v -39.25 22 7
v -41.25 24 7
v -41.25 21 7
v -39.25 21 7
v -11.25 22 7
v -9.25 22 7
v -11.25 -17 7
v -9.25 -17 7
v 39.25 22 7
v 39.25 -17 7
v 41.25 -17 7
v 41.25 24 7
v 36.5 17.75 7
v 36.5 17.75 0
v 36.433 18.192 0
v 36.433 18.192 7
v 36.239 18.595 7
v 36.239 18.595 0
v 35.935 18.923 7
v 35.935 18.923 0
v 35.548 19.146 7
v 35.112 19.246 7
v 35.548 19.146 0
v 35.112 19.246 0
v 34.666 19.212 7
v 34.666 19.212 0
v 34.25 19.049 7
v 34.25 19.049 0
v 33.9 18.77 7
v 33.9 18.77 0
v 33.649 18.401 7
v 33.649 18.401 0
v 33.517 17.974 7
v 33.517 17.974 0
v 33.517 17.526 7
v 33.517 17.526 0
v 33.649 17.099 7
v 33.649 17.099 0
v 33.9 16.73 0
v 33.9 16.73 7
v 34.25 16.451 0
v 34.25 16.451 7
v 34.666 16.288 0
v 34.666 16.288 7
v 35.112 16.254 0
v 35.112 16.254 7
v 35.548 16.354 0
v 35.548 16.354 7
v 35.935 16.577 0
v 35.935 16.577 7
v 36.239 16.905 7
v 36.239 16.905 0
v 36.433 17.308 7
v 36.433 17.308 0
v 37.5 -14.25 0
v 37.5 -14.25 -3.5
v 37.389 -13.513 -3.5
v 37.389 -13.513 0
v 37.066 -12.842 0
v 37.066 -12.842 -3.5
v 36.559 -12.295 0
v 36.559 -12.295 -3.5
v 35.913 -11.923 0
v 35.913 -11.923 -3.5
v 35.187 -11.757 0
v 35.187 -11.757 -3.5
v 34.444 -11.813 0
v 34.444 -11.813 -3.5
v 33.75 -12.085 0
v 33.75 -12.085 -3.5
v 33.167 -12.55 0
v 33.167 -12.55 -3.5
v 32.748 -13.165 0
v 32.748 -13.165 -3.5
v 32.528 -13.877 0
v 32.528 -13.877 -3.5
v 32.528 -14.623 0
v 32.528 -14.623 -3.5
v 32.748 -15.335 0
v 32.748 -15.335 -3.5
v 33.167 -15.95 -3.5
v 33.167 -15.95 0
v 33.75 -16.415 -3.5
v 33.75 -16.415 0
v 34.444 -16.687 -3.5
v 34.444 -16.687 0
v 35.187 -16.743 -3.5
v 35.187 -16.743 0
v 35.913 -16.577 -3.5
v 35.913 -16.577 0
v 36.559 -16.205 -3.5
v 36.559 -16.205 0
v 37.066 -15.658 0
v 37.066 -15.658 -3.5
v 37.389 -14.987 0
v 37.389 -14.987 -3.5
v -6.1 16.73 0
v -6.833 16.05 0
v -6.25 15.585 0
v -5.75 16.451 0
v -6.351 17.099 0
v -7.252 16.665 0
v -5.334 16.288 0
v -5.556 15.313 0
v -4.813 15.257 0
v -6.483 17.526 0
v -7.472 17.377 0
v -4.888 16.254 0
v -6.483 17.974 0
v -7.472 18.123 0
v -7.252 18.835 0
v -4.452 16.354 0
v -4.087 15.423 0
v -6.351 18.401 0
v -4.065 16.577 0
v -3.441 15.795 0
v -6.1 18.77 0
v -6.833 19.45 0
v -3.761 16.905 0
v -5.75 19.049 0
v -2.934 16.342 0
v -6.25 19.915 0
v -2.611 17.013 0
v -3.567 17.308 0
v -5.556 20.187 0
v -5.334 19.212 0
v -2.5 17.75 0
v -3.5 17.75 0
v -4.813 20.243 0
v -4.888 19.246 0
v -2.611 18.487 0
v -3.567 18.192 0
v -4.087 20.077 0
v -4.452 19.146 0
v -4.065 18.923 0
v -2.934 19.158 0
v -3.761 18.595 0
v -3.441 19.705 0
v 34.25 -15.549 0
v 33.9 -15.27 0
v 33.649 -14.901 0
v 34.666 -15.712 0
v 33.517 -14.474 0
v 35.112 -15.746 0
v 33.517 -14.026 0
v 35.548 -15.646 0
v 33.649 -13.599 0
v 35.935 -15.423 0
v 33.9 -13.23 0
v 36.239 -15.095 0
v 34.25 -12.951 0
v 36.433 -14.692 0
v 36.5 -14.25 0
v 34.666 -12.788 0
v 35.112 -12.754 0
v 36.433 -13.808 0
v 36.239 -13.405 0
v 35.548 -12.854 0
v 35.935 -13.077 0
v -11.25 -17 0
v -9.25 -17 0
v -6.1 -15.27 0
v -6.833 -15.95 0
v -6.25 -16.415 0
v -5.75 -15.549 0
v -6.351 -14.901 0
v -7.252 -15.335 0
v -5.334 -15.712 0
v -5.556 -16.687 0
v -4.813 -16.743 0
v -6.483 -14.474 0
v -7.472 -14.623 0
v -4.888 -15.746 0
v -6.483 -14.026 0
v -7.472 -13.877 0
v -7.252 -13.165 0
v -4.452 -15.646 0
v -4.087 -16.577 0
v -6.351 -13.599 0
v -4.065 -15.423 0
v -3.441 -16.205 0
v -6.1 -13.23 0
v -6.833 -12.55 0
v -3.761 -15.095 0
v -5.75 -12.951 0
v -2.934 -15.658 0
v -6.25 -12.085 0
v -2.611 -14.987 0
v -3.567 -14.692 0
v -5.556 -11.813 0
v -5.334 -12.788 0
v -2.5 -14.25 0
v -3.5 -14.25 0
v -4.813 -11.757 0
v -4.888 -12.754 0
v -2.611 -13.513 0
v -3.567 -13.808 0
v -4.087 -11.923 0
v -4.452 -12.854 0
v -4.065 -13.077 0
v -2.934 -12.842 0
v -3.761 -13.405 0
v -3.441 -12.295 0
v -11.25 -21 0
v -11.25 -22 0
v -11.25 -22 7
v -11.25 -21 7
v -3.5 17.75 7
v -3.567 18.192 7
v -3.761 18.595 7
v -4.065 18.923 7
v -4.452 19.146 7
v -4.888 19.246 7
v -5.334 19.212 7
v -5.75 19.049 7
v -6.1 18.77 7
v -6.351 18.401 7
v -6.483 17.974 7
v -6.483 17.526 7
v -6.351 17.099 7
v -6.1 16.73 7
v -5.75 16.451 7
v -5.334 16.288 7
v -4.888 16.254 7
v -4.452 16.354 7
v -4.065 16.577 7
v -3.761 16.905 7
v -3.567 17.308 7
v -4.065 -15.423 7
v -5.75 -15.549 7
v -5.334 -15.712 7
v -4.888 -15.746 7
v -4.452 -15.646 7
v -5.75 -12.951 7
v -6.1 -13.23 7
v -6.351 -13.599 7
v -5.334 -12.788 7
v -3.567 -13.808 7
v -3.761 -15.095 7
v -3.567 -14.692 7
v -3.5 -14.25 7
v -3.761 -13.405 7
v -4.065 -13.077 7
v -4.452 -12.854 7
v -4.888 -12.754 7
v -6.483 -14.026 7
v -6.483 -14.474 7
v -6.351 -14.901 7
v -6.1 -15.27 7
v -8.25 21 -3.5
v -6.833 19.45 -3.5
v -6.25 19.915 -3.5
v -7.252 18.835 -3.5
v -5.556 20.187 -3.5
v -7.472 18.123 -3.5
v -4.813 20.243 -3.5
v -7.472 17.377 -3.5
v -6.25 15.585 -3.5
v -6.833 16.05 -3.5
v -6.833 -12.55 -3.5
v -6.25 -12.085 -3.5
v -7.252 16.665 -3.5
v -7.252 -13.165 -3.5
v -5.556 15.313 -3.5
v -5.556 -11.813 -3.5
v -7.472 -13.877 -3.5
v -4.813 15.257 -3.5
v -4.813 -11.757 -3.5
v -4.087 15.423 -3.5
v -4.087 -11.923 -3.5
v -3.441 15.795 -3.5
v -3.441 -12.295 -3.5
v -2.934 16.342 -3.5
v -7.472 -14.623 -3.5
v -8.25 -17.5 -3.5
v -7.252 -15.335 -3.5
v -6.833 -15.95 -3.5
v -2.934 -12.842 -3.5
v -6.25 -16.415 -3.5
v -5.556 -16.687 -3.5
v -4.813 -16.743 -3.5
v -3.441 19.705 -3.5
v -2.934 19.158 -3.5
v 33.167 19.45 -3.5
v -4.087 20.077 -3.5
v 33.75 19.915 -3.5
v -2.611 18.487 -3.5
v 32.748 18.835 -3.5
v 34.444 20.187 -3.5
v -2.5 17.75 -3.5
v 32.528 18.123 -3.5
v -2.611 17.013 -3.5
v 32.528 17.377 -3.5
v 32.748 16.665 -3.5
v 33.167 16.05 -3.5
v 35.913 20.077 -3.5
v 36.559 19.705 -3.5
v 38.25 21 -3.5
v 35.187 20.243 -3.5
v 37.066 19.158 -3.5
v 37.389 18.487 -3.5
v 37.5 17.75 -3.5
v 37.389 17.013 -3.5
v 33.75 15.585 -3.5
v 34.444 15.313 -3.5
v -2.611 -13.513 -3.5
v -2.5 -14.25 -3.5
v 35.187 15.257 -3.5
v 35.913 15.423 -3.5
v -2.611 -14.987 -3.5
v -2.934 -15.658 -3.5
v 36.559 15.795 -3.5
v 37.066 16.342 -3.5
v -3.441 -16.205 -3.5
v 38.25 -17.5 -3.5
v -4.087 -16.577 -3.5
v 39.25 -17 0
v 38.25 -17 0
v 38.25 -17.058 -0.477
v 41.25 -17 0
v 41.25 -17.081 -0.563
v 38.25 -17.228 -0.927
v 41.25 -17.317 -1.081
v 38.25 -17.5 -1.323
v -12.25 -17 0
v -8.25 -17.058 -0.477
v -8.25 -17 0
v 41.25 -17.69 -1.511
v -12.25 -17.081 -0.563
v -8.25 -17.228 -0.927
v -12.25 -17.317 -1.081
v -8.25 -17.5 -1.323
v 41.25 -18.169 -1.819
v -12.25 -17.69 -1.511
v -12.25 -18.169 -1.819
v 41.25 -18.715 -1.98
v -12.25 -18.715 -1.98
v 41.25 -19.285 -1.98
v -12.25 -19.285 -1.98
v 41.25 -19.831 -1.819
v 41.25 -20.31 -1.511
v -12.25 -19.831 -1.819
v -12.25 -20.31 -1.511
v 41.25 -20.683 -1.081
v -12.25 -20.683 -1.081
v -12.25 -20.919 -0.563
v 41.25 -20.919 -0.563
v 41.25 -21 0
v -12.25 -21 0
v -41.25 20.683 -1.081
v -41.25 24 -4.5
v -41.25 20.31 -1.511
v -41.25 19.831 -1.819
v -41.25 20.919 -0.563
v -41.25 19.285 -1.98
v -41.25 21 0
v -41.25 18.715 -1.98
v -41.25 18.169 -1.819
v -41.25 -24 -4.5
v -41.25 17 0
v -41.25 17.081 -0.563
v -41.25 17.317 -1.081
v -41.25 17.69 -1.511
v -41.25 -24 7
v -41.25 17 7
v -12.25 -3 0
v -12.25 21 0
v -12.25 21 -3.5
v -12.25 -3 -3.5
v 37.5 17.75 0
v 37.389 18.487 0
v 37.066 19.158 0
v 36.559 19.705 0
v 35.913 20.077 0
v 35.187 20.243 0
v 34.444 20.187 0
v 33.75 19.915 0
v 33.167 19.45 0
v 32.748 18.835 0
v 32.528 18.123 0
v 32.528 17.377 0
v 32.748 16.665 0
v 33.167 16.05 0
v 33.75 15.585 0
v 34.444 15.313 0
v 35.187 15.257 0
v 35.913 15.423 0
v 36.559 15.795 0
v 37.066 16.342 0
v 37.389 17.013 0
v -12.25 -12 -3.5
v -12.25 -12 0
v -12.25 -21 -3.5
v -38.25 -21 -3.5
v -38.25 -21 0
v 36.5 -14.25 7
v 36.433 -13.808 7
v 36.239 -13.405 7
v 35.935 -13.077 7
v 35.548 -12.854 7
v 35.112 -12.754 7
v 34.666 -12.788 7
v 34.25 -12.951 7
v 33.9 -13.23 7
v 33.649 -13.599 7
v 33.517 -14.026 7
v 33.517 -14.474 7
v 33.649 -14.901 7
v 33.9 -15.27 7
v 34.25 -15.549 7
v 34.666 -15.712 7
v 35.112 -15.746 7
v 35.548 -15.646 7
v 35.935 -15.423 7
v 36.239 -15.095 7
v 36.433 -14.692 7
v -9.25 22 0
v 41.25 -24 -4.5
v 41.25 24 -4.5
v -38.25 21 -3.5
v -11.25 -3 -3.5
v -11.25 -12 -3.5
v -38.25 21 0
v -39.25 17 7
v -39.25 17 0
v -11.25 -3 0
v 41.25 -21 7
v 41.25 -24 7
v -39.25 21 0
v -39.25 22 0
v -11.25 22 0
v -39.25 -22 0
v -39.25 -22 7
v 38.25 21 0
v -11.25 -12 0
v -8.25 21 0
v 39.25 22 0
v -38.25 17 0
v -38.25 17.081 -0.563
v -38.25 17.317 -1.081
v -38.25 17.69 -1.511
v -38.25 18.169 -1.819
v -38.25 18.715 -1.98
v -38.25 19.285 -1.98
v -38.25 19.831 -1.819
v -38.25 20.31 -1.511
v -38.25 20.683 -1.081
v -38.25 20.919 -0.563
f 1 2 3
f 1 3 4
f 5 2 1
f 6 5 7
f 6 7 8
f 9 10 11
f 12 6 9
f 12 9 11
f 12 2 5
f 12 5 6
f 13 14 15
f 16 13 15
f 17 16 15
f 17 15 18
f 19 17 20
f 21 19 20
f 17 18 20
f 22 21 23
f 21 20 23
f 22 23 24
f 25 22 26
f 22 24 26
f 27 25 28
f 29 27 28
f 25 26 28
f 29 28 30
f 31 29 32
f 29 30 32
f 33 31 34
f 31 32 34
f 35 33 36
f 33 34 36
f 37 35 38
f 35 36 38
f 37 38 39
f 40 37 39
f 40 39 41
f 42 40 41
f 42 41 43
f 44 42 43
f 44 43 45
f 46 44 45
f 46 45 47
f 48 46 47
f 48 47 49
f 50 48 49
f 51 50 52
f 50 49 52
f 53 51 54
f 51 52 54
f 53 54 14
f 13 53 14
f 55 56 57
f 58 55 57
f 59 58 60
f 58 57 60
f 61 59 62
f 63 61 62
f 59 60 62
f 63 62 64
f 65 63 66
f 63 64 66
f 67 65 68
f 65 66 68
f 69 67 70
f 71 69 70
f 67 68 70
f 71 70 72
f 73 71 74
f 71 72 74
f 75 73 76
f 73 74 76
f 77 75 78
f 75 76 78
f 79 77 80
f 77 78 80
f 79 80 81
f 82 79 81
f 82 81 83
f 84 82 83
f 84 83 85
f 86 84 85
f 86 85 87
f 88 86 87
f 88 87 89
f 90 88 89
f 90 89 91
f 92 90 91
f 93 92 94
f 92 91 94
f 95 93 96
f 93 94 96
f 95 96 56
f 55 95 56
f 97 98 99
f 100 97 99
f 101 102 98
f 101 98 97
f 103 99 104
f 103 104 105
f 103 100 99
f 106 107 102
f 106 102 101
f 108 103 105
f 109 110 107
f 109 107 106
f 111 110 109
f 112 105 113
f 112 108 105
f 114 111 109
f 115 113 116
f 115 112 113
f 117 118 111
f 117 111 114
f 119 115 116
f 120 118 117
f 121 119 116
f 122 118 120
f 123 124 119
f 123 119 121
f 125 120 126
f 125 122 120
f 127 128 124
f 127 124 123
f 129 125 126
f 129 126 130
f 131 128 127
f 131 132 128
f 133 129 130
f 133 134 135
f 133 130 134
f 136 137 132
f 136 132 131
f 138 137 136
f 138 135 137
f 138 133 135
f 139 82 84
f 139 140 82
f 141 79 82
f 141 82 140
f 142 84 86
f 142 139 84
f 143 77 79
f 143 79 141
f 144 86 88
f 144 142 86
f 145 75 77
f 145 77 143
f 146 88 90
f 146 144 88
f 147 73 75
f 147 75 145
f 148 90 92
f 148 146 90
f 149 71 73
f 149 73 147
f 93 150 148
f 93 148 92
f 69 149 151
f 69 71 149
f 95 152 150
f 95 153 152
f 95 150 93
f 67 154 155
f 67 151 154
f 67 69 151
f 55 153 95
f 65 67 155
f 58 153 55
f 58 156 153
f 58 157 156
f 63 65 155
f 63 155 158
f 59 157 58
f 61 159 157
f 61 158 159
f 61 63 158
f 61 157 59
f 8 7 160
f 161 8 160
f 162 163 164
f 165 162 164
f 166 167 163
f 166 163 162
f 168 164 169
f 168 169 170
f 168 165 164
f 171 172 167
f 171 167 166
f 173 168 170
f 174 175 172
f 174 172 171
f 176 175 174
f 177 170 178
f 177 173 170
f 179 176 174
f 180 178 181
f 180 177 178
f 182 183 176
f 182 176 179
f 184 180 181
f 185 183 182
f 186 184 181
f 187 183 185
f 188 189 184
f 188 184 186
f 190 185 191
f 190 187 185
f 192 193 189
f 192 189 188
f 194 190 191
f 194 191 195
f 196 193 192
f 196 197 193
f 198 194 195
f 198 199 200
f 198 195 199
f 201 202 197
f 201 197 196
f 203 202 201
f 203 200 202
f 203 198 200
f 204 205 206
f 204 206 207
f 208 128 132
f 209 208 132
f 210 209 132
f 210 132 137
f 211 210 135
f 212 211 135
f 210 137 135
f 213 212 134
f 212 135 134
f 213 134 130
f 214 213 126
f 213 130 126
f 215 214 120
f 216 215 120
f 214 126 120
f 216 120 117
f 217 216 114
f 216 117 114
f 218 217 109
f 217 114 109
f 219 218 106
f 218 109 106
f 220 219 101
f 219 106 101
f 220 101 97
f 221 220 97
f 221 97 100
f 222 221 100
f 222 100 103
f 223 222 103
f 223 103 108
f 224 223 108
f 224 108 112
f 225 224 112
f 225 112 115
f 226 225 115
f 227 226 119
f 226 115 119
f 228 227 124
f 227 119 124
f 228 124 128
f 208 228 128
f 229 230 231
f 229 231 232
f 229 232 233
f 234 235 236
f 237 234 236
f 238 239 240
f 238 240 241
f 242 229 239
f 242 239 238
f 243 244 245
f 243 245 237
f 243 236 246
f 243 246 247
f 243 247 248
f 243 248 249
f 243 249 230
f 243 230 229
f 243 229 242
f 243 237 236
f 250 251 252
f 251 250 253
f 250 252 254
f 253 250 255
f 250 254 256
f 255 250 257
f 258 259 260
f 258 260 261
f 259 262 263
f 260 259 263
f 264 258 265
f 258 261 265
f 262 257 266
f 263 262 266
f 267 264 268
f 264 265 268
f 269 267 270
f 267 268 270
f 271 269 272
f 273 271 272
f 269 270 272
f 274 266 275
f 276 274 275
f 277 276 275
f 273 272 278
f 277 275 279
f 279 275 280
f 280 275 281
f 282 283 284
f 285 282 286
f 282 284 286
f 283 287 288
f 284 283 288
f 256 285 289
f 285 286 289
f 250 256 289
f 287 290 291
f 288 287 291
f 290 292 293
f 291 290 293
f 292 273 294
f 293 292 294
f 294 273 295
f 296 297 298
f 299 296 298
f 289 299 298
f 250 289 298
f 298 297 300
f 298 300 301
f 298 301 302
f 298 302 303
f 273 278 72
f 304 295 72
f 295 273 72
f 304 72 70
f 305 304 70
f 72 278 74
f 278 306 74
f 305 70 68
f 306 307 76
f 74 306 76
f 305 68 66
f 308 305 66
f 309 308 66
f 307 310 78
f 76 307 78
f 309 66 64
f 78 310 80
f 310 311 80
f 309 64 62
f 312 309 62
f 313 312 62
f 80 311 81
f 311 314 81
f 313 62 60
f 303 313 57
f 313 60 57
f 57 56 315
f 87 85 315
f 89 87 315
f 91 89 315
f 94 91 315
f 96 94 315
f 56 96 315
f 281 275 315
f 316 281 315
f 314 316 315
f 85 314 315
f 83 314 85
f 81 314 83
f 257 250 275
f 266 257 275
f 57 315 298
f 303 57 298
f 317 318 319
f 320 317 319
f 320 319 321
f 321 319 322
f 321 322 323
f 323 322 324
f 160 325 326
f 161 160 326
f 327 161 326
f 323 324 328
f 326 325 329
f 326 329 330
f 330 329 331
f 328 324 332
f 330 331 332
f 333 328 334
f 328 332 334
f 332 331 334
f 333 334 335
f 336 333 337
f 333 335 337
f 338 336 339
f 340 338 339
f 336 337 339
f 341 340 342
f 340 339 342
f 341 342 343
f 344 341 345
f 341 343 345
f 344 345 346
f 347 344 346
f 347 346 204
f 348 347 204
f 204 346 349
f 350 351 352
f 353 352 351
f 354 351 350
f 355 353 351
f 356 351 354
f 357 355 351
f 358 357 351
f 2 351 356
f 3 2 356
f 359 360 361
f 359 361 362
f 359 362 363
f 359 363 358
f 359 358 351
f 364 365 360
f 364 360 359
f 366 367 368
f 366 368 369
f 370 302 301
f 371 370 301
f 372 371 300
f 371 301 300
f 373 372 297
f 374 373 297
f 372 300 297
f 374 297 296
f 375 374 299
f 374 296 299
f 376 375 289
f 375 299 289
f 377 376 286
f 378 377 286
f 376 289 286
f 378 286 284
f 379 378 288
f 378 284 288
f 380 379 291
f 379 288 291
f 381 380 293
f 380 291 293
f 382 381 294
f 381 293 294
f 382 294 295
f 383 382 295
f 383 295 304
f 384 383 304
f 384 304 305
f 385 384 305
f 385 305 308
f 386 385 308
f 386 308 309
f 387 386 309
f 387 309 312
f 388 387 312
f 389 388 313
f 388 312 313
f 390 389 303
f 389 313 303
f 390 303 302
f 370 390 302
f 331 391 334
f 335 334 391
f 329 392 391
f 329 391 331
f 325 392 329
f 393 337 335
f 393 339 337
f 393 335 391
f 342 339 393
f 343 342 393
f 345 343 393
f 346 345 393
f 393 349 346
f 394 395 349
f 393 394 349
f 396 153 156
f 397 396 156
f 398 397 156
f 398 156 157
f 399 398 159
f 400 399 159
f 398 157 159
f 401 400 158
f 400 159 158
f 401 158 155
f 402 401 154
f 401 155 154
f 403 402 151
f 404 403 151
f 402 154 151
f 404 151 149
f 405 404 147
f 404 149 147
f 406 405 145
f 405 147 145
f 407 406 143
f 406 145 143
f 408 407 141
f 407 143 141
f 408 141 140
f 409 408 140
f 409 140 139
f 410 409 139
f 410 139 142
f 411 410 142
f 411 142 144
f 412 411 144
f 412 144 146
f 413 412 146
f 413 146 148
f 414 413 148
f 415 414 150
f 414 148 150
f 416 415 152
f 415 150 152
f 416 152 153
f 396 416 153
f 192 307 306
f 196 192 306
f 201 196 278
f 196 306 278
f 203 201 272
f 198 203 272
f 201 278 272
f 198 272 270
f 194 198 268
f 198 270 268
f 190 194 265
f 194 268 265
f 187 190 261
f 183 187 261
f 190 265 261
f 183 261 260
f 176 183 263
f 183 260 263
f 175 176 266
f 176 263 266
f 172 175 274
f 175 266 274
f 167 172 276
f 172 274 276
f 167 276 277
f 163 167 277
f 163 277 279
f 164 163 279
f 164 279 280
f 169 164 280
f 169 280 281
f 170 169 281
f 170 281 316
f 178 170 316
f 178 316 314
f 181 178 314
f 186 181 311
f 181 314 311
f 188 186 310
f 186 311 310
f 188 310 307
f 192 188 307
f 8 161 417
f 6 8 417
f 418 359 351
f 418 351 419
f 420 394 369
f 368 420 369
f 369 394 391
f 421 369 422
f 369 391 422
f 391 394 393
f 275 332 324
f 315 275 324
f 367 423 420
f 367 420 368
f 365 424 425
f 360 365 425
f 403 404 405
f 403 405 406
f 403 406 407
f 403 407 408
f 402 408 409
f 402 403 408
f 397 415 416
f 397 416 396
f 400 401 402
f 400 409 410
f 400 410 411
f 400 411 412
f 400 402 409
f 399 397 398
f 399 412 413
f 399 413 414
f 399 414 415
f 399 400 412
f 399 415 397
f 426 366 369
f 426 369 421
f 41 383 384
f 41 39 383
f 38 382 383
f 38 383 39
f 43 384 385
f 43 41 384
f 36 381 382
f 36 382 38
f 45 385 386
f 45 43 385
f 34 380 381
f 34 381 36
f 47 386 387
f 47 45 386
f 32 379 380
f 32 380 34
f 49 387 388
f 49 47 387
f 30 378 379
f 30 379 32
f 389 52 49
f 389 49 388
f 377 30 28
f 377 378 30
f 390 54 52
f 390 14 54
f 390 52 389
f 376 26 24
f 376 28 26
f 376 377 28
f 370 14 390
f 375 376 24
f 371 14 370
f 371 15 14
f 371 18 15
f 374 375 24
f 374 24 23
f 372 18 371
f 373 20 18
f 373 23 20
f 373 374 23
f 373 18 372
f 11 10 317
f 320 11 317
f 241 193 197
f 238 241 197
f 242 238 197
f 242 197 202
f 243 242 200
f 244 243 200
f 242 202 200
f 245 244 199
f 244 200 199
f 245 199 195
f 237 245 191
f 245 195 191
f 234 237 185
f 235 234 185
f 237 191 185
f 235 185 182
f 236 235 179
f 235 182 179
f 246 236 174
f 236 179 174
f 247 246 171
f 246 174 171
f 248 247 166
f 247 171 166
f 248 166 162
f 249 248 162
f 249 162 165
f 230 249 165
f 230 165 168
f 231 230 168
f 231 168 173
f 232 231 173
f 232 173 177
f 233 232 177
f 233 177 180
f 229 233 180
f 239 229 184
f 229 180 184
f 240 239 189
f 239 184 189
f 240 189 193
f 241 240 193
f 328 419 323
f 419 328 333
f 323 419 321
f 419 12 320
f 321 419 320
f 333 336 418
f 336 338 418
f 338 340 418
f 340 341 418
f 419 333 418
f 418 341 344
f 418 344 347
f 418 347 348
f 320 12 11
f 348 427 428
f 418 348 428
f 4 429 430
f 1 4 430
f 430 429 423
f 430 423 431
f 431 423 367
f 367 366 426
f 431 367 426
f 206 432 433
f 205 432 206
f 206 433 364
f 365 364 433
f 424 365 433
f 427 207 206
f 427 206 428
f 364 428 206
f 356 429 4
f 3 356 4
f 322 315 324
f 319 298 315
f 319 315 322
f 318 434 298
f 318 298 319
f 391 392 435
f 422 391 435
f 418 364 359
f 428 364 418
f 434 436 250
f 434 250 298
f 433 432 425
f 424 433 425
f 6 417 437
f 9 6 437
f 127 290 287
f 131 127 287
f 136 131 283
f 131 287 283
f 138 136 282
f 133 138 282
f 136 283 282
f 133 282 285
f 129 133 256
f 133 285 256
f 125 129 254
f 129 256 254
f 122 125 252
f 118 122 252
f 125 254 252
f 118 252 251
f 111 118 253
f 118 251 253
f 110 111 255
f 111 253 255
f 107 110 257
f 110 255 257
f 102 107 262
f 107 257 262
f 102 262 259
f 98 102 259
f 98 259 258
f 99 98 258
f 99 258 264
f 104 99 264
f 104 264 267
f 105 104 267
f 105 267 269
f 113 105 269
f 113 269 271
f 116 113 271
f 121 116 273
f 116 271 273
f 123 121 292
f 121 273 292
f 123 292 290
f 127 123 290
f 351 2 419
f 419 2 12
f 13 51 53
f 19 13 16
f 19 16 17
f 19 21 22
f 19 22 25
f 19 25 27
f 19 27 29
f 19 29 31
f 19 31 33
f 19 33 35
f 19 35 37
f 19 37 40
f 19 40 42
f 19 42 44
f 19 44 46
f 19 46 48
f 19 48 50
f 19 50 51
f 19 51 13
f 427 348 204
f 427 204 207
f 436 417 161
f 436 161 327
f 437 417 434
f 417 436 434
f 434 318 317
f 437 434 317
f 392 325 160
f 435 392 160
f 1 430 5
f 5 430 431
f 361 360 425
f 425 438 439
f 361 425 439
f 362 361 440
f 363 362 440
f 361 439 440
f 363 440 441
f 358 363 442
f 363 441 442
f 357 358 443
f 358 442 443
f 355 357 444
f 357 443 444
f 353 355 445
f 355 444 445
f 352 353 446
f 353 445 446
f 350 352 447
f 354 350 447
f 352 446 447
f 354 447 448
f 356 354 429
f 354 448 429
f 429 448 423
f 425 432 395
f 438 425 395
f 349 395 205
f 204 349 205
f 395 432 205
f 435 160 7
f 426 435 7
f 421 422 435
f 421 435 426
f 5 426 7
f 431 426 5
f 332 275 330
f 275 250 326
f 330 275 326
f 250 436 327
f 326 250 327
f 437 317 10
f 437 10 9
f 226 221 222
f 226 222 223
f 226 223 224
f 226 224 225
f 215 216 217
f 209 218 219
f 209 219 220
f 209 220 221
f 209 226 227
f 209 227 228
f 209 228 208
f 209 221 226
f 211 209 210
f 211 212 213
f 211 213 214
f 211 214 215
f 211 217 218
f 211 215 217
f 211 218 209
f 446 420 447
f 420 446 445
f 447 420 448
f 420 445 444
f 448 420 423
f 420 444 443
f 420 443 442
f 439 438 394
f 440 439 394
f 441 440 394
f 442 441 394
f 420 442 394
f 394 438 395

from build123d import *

# Parameters (mm, degrees)
SKETCH005_W     = 82.5
SKETCH005_H     = 48
SKETCH005_W_2   = 28
SKETCH005_H_2   = 44
SKETCH005_W_3   = 48.5
SKETCH005_H_3   = 40.5
PAD003_DEPTH    = 7
SKETCH006_W     = 82.5
SKETCH006_H     = 48
SKETCH006_W_2   = 26
SKETCH006_H_2   = 42
SKETCH006_W_3   = 46.5
SKETCH006_H_3   = 38.5
PAD004_DEPTH    = 3.5
SKETCH007_W     = 82.5
SKETCH007_H     = 48
PAD005_DEPTH    = 1
SKETCH008_R     = 2.5
PAD006_DEPTH    = 3.5
SKETCH009_R     = 1.5
PAD007_DEPTH    = 7
POCKET002_DEPTH = 3.001
POCKET003_DEPTH = 53.501
SKETCH_W        = 1
SKETCH_H        = 9
POCKET_DEPTH    = 3.5


with BuildPart() as part:
    # Sketch005 → Pad003 (new body)
    with BuildSketch(Plane.XY):
        Rectangle(SKETCH005_W, SKETCH005_H)
        with Locations((-25.25, 0)):
            Rectangle(SKETCH005_W_2, SKETCH005_H_2, mode=Mode.SUBTRACT)
        with Locations((15, 1.75)):
            Rectangle(SKETCH005_W_3, SKETCH005_H_3, mode=Mode.SUBTRACT)
    extrude(amount=PAD003_DEPTH)

    # Sketch006 (on Face13 of Pad003) → Pad004 (join)
    with BuildSketch(Plane(origin=(0, 0, 0), x_dir=(1, 0, 0), z_dir=(0, 0, -1))):
        Rectangle(SKETCH006_W, SKETCH006_H)
        with Locations((-25.25, 0)):
            Rectangle(SKETCH006_W_2, SKETCH006_H_2, mode=Mode.SUBTRACT)
        with Locations((15, -1.75)):
            Rectangle(SKETCH006_W_3, SKETCH006_H_3, mode=Mode.SUBTRACT)
    extrude(amount=PAD004_DEPTH)

    # Sketch007 (on Face11 of Pad004) → Pad005 (join)
    with BuildSketch(Plane(origin=(0, 0, -3.5), x_dir=(1, 0, 0), z_dir=(0, 0, -1))):
        Rectangle(SKETCH007_W, SKETCH007_H)
    extrude(amount=PAD005_DEPTH)

    # Sketch008 (on Face22 of Pad005) → Pad006 (join)
    with BuildSketch(Plane.XY.offset(-3.5)):
        with Locations((-5, 17.75)):
            Circle(SKETCH008_R)
        with Locations((35, 17.75)):
            Circle(SKETCH008_R)
        with Locations((35, -14.25)):
            Circle(SKETCH008_R)
        with Locations((-5, -14.25)):
            Circle(SKETCH008_R)
    extrude(amount=PAD006_DEPTH)

    # Sketch009 (on Face34 of Pad006) → Pad007 (join)
    with BuildSketch(Plane.XY):
        with Locations((-5, 17.75)):
            Circle(SKETCH009_R)
        with Locations((35, 17.75)):
            Circle(SKETCH009_R)
        with Locations((35, -14.25)):
            Circle(SKETCH009_R)
        with Locations((-5, -14.25)):
            Circle(SKETCH009_R)
    extrude(amount=PAD007_DEPTH)

    # Sketch010 (on Face21 of Pad007) → Pocket002 (cut, through all)
    with BuildSketch(Plane.YZ.offset(-38.25)):
        with BuildLine():
            Line((21, 0), (21, 7))
            Line((21, 7), (17, 7))
            Line((17, 7), (17, 0))
            ThreePointArc((17, 0), (19, -2), (21, 0))
        make_face()
    extrude(amount=-POCKET002_DEPTH, mode=Mode.SUBTRACT)

    # Sketch011 (on Face25 of Pocket002) → Pocket003 (cut, through all)
    with BuildSketch(Plane(origin=(-12.25, 0, 0), x_dir=(0, -1, 0), z_dir=(-1, 0, 0))):
        with BuildLine():
            Line((21, 0), (21, 7))
            Line((21, 7), (17, 7))
            Line((17, 7), (17, 0))
            ThreePointArc((17, 0), (19, -2), (21, 0))
        make_face()
    extrude(amount=-POCKET003_DEPTH, mode=Mode.SUBTRACT)

    # Sketch (on Face22 of Pocket003) → Pocket (cut)
    with BuildSketch(Plane.XY):
        with Locations((-11.75, -7.5)):
            Rectangle(SKETCH_W, SKETCH_H)
    extrude(amount=-POCKET_DEPTH, mode=Mode.SUBTRACT)


solid = part.part
